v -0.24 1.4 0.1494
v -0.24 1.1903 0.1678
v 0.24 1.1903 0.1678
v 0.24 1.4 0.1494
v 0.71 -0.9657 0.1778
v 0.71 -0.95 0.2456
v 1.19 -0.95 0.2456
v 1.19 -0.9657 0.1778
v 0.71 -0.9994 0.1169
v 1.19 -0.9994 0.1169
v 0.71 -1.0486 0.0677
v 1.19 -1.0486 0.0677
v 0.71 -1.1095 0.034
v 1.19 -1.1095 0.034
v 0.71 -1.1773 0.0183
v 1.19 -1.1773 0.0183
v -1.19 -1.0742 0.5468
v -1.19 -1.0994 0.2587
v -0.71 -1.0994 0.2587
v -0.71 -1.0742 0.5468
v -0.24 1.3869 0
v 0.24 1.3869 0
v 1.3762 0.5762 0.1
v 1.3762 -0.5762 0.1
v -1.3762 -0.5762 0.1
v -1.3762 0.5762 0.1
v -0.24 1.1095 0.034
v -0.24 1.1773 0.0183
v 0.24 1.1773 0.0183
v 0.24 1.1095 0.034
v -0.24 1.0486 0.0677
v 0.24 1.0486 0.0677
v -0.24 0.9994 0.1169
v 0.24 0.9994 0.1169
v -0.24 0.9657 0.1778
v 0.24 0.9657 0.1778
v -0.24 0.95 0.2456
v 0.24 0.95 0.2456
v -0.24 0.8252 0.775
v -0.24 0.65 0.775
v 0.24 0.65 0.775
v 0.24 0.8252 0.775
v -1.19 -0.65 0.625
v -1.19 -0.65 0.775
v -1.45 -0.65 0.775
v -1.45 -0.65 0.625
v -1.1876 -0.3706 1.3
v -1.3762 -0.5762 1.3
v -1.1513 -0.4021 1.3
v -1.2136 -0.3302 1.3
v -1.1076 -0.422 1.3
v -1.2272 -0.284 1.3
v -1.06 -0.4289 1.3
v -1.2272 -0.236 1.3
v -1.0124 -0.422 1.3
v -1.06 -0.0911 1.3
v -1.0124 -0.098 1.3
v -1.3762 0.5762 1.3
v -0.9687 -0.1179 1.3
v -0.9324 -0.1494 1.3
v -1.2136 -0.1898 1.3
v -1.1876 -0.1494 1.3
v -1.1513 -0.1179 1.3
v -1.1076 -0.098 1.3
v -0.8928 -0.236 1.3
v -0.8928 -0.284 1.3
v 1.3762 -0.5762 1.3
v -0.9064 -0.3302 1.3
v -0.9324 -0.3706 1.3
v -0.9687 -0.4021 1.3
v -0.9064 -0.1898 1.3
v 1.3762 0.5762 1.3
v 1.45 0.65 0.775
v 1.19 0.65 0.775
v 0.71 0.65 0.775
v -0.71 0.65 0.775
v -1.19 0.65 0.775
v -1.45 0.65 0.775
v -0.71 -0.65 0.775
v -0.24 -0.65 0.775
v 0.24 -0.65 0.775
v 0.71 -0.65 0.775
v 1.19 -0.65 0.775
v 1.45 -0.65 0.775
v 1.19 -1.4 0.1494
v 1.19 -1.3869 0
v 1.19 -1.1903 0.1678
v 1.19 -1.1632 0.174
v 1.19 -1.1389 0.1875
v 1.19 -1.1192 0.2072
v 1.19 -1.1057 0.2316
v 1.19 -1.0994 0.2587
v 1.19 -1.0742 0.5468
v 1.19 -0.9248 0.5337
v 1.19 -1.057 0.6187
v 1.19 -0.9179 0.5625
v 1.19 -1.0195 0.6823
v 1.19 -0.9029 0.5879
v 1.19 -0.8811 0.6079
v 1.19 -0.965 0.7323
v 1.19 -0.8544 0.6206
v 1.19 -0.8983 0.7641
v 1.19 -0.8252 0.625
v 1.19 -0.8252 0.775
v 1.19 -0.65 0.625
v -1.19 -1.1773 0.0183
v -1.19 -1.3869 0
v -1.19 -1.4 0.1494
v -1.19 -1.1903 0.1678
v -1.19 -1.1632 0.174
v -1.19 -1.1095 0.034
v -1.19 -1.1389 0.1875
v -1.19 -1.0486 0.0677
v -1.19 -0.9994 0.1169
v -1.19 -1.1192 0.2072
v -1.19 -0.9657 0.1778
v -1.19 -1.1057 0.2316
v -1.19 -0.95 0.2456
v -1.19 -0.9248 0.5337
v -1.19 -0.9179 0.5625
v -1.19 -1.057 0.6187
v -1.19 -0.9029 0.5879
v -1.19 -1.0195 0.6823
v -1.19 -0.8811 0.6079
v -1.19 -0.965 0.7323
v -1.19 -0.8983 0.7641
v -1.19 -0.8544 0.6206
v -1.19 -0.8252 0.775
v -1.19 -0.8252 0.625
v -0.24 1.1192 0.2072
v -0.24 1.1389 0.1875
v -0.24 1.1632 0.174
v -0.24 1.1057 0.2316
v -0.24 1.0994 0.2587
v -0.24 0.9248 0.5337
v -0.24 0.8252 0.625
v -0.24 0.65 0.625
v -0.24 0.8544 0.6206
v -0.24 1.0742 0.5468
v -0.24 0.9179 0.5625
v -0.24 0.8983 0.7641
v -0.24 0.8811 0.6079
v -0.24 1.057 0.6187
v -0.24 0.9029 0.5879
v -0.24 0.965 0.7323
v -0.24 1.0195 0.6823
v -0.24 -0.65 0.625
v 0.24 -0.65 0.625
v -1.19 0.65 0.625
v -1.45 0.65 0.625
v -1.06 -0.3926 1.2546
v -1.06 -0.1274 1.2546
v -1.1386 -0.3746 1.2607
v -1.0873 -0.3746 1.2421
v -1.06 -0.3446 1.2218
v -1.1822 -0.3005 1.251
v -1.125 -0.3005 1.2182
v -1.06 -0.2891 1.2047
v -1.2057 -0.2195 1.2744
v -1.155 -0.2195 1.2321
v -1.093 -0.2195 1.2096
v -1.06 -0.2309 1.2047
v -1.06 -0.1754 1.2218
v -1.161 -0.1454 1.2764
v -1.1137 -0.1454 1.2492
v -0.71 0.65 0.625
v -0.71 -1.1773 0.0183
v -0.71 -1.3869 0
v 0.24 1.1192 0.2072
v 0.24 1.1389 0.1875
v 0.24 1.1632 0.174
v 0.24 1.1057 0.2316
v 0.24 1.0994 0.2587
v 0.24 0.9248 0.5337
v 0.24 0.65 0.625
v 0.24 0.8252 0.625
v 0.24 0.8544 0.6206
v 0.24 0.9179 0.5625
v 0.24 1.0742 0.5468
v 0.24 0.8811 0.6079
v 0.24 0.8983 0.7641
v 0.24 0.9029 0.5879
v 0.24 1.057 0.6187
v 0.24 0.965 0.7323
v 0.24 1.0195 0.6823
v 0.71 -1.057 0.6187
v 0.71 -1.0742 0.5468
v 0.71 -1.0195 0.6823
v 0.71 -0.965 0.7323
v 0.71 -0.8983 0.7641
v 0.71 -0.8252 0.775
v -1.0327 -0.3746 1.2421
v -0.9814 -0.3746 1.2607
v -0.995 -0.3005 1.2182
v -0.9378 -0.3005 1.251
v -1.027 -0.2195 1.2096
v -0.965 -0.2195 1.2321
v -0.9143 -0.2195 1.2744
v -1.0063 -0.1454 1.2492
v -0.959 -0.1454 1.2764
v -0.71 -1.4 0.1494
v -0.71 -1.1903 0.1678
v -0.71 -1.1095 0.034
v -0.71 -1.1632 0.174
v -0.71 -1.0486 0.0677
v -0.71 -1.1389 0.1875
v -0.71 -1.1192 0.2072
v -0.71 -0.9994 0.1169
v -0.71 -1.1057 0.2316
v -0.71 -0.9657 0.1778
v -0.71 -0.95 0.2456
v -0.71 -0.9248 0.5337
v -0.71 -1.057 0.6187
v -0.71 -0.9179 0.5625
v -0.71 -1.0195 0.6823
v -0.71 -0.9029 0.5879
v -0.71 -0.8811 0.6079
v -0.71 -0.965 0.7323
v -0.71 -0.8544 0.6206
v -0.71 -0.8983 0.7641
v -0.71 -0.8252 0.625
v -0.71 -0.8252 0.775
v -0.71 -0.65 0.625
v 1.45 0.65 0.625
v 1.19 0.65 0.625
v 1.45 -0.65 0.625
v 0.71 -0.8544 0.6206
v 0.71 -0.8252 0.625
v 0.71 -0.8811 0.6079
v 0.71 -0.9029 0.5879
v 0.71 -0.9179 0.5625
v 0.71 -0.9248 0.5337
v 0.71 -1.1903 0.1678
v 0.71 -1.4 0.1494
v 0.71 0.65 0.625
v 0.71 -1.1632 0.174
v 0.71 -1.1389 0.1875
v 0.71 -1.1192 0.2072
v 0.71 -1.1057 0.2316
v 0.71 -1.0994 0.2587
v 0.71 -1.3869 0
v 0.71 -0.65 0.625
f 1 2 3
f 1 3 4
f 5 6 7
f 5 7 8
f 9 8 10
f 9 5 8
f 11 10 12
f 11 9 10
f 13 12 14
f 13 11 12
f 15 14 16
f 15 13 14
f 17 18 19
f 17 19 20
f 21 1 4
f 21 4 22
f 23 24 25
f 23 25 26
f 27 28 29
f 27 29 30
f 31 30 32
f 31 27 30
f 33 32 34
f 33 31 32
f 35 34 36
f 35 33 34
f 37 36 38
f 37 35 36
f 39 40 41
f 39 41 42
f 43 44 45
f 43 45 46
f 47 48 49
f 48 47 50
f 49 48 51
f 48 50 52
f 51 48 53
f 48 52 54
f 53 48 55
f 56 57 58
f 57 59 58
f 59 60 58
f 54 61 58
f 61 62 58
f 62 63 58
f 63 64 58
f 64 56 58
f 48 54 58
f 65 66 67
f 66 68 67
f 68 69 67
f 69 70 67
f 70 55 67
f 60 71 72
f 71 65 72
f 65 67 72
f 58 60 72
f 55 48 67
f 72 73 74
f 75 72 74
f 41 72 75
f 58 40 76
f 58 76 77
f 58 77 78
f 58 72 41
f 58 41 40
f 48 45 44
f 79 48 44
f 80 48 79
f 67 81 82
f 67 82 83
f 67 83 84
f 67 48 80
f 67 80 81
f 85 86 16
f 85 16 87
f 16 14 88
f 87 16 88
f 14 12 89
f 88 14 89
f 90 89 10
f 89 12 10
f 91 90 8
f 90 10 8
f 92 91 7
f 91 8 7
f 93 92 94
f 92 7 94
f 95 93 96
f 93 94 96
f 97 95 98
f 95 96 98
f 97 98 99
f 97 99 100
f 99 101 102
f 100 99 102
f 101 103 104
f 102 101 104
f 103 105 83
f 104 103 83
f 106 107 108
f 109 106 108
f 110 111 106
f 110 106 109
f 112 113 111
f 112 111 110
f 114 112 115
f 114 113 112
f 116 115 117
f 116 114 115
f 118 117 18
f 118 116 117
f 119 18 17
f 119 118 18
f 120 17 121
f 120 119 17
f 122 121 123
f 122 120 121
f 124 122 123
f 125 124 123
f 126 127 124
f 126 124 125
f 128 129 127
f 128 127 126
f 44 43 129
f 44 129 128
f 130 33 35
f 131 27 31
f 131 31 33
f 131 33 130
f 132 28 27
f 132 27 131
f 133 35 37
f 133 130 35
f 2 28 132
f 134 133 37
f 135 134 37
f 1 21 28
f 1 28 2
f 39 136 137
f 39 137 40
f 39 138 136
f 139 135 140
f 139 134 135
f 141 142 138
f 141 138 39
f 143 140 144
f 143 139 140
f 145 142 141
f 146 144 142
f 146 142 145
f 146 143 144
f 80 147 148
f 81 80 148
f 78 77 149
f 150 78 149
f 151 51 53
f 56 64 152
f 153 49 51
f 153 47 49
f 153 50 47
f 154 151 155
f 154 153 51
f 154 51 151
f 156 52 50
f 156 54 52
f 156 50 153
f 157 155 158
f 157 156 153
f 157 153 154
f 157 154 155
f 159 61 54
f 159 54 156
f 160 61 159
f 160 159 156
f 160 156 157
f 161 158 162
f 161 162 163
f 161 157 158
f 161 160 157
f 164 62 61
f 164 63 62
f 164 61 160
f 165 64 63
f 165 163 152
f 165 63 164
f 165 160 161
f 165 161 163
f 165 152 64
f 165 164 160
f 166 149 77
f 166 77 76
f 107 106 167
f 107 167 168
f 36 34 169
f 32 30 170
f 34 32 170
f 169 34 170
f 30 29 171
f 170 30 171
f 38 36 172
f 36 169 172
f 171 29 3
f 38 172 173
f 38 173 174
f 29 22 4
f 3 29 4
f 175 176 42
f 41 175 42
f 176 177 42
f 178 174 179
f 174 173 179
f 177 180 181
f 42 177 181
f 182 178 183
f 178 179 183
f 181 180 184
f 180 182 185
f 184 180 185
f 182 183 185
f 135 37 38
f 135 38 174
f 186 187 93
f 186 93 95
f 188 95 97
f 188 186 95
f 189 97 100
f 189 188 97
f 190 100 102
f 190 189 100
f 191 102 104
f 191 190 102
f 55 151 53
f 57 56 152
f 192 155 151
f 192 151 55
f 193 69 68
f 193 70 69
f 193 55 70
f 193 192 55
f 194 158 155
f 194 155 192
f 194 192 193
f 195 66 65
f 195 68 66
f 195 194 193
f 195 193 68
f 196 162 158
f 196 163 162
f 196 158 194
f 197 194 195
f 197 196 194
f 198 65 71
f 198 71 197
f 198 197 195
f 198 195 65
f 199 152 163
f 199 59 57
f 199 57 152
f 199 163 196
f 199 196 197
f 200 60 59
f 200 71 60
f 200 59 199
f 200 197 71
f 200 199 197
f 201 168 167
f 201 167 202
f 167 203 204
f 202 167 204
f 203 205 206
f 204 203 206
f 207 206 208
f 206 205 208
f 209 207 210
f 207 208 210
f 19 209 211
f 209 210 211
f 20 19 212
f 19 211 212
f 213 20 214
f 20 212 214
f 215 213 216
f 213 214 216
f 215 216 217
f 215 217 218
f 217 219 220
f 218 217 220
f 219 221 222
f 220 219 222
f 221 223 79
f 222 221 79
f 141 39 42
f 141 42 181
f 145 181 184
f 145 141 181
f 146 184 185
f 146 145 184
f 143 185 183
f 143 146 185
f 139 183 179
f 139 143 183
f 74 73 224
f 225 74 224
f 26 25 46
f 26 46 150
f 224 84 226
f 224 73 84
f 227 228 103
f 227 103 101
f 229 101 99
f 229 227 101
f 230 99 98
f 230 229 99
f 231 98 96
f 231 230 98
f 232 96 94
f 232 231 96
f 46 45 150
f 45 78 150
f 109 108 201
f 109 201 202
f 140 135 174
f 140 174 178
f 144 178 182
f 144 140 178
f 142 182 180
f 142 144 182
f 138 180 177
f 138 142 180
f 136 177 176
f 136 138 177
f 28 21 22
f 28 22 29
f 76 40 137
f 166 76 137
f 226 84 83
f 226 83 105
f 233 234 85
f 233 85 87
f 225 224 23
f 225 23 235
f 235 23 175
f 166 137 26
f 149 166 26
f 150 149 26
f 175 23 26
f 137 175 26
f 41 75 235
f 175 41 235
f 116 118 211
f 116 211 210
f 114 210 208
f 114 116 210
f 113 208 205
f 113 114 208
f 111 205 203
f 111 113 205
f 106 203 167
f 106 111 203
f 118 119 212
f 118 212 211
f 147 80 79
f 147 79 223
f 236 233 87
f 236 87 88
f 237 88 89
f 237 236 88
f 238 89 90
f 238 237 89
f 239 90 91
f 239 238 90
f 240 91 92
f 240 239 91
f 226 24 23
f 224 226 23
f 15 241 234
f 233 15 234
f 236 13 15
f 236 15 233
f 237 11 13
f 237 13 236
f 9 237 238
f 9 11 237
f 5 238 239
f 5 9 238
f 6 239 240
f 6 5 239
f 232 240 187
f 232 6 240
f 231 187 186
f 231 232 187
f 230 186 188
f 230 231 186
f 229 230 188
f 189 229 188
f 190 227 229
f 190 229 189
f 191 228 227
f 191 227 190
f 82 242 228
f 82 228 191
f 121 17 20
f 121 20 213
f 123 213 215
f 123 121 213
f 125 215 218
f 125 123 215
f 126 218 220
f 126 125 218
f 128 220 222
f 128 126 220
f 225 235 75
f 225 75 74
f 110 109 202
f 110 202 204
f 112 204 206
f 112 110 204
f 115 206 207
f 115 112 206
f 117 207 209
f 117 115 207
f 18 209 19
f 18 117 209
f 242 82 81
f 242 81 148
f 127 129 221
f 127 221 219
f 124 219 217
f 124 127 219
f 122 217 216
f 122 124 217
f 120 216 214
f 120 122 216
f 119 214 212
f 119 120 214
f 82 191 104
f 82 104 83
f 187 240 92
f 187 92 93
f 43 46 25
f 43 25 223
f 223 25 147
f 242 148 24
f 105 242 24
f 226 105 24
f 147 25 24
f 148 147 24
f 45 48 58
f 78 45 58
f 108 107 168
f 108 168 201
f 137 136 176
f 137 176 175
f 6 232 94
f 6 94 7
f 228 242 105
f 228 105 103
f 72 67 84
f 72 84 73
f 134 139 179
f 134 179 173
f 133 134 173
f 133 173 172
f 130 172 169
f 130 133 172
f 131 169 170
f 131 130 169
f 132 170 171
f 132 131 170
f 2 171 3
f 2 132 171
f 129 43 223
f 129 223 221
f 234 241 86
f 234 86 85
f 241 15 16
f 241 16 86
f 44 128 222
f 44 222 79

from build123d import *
from OCP.BRepFilletAPI import BRepFilletAPI_MakeChamfer
from build123d.topology import SkipClean

# Parameters (mm, degrees)
BODYWXH_W               = 1.2
BODYWXH_H               = 1.3
BOSS_BODY_DEPTH         = 1.45
CHAMFER1_SIZE           = 0.525
CHAMFER1_SIZE2          = 0.073783938
PINS_DEPTH              = 0.48
PATTERNLEADS_COUNT      = 3
PATTERNLEADS_PITCH      = 0.95
DELETEFACE1_START       = 0.65
DELETEFACE1_OUTLINE_W   = 0.48
DELETEFACE1_OUTLINE_H   = 1.775
DELETEFACE1_DEPTH       = 0.75
DELETEFACE1_START_2     = -1.4
DELETEFACE1_2_OUTLINE_W = 0.48
DELETEFACE1_2_OUTLINE_H = 1.775
DELETEFACE1_2_DEPTH     = 0.75


# Read off the part's stored shape, not the designer's step: DeleteFace1
with BuildPart() as part:
    # BodyWxH → Boss-Body (new, symmetric)
    with BuildSketch(Plane(origin=(0, 0, 0), x_dir=(0, 0, -1), z_dir=(1, 0, 0))):
        with Locations((-0.7, 0)):
            Rectangle(BODYWXH_W, BODYWXH_H)
    extrude(amount=BOSS_BODY_DEPTH, both=True)

    # Chamfer1: one chamfer whose edges measure the first distance from different faces: ONE call of the kernel's chamfer builder (chamfer() names one face for all edges)
    chamfer1_edges_1 = [part.edges().sort_by_distance(p)[0] for p in [
        (1.45, 0, 0.1),
        (1.45, 0, 1.3),
    ]]
    chamfer1_side_1 = [part.faces().sort_by_distance(p)[0] for p in [
        (1.45, 0, 0.7),
    ]]
    chamfer1_edges_2 = [part.edges().sort_by_distance(p)[0] for p in [
        (-1.45, 0, 0.1),
        (-1.45, 0, 1.3),
    ]]
    chamfer1_side_2 = [part.faces().sort_by_distance(p)[0] for p in [
        (-1.45, 0, 0.7),
    ]]
    chamfer1_edges_3 = [part.edges().sort_by_distance(p)[0] for p in [
        (0, 0.65, 1.3),
        (0, 0.65, 0.1),
    ]]
    chamfer1_side_3 = [part.faces().sort_by_distance(p)[0] for p in [
        (0, 0.65, 0.7),
    ]]
    chamfer1_edges_4 = [part.edges().sort_by_distance(p)[0] for p in [
        (0, -0.65, 0.1),
        (0, -0.65, 1.3),
    ]]
    chamfer1_side_4 = [part.faces().sort_by_distance(p)[0] for p in [
        (0, -0.65, 0.7),
    ]]
    chamfer1 = BRepFilletAPI_MakeChamfer(part.part.solid().wrapped)
    for e in chamfer1_edges_1:
        chamfer1.Add(CHAMFER1_SIZE, CHAMFER1_SIZE2, e.wrapped, chamfer1_side_1[0].wrapped)  # the first distance lies on this face
    for e in chamfer1_edges_2:
        chamfer1.Add(CHAMFER1_SIZE, CHAMFER1_SIZE2, e.wrapped, chamfer1_side_2[0].wrapped)  # the first distance lies on this face
    for e in chamfer1_edges_3:
        chamfer1.Add(CHAMFER1_SIZE, CHAMFER1_SIZE2, e.wrapped, chamfer1_side_3[0].wrapped)  # the first distance lies on this face
    for e in chamfer1_edges_4:
        chamfer1.Add(CHAMFER1_SIZE, CHAMFER1_SIZE2, e.wrapped, chamfer1_side_4[0].wrapped)  # the first distance lies on this face
    add(Compound.cast(chamfer1.Shape()), mode=Mode.REPLACE)

    # LeadCross → Pins (add)
    with BuildSketch(Plane(origin=(-1.19, 0, 0), x_dir=(0, 0, -1), z_dir=(1, 0, 0))):
        with BuildLine():
            Line((0, -1.386926639), (-0.149429205, -1.4))
            Line((-0.149429205, -1.4), (-0.167772682, -1.1903331))
            ThreePointArc((-0.167772682, -1.1903331), (-0.196681473, -1.128337996), (-0.258676577, -1.099429205))
            Line((-0.258676577, -1.099429205), (-0.546788936, -1.07422264))
            ThreePointArc((-0.546788936, -1.07422264), (-0.709319334, -0.994071517), (-0.775, -0.825173965))
            Line((-0.775, -0.825173965), (-0.775, 0.825173965))
            ThreePointArc((-0.775, 0.825173965), (-0.709319334, 0.994071517), (-0.546788936, 1.07422264))
            Line((-0.546788936, 1.07422264), (-0.258676577, 1.099429205))
            ThreePointArc((-0.258676577, 1.099429205), (-0.196681473, 1.128337996), (-0.167772682, 1.1903331))
            Line((-0.167772682, 1.1903331), (-0.149429205, 1.4))
            Line((-0.149429205, 1.4), (0, 1.386926639))
            Line((0, 1.386926639), (-0.018343477, 1.177259739))
            ThreePointArc((-0.018343477, 1.177259739), (-0.090615456, 1.022271979), (-0.245603216, 0.95))
            Line((-0.245603216, 0.95), (-0.533715574, 0.924793435))
            ThreePointArc((-0.533715574, 0.924793435), (-0.598727734, 0.892732986), (-0.625, 0.825173965))
            Line((-0.625, 0.825173965), (-0.625, -0.825173965))
            ThreePointArc((-0.625, -0.825173965), (-0.598727734, -0.892732986), (-0.533715574, -0.924793435))
            Line((-0.533715574, -0.924793435), (-0.245603216, -0.95))
            ThreePointArc((-0.245603216, -0.95), (-0.090615456, -1.022271979), (-0.018343477, -1.177259739))
            Line((-0.018343477, -1.177259739), (0, -1.386926639))
        make_face()
    pins = extrude(amount=PINS_DEPTH)

    # PatternLeads: Pins ×3
    with Locations(*[(i * PATTERNLEADS_PITCH, 0, 0) for i in range(1, PATTERNLEADS_COUNT)]):
        add(pins)

    # Pin1Indent → Cut-Pin1Indent (revolve, cut)
    with SkipClean():  # the faces are left unmerged after this step: merging them gives an invalid solid
        with BuildSketch(Plane(origin=(-1.06, 0, 0), x_dir=(0, 0, -1), z_dir=(1, 0, 0))):
            with BuildLine():
                Line((-1.3975, -0.065), (-1.3975, -0.455))
                ThreePointArc((-1.3975, -0.455), (-1.2025, -0.26), (-1.3975, -0.065))
            make_face()
        revolve(axis=Axis((-1.06, -0.065, 1.3975), (0, -1, 0)), mode=Mode.SUBTRACT)

    # DeleteFace1 outline → DeleteFace1 (cut)
    with SkipClean():  # the faces are left unmerged after this step: merging them gives an invalid solid
        with BuildSketch(Plane(origin=(0, 0, 0), x_dir=(1, 0, 0), z_dir=(0, 1, 0)).offset(DELETEFACE1_START)):
            with Locations((-0.95, 0.1125)):
                Rectangle(DELETEFACE1_OUTLINE_W, DELETEFACE1_OUTLINE_H)
            with Locations((0.95, 0.1125)):
                Rectangle(DELETEFACE1_OUTLINE_W, DELETEFACE1_OUTLINE_H)
        extrude(amount=DELETEFACE1_DEPTH, mode=Mode.SUBTRACT)

    # DeleteFace1 2 outline → DeleteFace1 2 (cut)
    with SkipClean():  # the faces are left unmerged after this step: merging them gives an invalid solid
        with BuildSketch(Plane(origin=(0, 0, 0), x_dir=(1, 0, 0), z_dir=(0, 1, 0)).offset(DELETEFACE1_START_2)):
            with Locations((0, 0.1125)):
                Rectangle(DELETEFACE1_2_OUTLINE_W, DELETEFACE1_2_OUTLINE_H)
        extrude(amount=DELETEFACE1_2_DEPTH, mode=Mode.SUBTRACT)


solid = part.part
